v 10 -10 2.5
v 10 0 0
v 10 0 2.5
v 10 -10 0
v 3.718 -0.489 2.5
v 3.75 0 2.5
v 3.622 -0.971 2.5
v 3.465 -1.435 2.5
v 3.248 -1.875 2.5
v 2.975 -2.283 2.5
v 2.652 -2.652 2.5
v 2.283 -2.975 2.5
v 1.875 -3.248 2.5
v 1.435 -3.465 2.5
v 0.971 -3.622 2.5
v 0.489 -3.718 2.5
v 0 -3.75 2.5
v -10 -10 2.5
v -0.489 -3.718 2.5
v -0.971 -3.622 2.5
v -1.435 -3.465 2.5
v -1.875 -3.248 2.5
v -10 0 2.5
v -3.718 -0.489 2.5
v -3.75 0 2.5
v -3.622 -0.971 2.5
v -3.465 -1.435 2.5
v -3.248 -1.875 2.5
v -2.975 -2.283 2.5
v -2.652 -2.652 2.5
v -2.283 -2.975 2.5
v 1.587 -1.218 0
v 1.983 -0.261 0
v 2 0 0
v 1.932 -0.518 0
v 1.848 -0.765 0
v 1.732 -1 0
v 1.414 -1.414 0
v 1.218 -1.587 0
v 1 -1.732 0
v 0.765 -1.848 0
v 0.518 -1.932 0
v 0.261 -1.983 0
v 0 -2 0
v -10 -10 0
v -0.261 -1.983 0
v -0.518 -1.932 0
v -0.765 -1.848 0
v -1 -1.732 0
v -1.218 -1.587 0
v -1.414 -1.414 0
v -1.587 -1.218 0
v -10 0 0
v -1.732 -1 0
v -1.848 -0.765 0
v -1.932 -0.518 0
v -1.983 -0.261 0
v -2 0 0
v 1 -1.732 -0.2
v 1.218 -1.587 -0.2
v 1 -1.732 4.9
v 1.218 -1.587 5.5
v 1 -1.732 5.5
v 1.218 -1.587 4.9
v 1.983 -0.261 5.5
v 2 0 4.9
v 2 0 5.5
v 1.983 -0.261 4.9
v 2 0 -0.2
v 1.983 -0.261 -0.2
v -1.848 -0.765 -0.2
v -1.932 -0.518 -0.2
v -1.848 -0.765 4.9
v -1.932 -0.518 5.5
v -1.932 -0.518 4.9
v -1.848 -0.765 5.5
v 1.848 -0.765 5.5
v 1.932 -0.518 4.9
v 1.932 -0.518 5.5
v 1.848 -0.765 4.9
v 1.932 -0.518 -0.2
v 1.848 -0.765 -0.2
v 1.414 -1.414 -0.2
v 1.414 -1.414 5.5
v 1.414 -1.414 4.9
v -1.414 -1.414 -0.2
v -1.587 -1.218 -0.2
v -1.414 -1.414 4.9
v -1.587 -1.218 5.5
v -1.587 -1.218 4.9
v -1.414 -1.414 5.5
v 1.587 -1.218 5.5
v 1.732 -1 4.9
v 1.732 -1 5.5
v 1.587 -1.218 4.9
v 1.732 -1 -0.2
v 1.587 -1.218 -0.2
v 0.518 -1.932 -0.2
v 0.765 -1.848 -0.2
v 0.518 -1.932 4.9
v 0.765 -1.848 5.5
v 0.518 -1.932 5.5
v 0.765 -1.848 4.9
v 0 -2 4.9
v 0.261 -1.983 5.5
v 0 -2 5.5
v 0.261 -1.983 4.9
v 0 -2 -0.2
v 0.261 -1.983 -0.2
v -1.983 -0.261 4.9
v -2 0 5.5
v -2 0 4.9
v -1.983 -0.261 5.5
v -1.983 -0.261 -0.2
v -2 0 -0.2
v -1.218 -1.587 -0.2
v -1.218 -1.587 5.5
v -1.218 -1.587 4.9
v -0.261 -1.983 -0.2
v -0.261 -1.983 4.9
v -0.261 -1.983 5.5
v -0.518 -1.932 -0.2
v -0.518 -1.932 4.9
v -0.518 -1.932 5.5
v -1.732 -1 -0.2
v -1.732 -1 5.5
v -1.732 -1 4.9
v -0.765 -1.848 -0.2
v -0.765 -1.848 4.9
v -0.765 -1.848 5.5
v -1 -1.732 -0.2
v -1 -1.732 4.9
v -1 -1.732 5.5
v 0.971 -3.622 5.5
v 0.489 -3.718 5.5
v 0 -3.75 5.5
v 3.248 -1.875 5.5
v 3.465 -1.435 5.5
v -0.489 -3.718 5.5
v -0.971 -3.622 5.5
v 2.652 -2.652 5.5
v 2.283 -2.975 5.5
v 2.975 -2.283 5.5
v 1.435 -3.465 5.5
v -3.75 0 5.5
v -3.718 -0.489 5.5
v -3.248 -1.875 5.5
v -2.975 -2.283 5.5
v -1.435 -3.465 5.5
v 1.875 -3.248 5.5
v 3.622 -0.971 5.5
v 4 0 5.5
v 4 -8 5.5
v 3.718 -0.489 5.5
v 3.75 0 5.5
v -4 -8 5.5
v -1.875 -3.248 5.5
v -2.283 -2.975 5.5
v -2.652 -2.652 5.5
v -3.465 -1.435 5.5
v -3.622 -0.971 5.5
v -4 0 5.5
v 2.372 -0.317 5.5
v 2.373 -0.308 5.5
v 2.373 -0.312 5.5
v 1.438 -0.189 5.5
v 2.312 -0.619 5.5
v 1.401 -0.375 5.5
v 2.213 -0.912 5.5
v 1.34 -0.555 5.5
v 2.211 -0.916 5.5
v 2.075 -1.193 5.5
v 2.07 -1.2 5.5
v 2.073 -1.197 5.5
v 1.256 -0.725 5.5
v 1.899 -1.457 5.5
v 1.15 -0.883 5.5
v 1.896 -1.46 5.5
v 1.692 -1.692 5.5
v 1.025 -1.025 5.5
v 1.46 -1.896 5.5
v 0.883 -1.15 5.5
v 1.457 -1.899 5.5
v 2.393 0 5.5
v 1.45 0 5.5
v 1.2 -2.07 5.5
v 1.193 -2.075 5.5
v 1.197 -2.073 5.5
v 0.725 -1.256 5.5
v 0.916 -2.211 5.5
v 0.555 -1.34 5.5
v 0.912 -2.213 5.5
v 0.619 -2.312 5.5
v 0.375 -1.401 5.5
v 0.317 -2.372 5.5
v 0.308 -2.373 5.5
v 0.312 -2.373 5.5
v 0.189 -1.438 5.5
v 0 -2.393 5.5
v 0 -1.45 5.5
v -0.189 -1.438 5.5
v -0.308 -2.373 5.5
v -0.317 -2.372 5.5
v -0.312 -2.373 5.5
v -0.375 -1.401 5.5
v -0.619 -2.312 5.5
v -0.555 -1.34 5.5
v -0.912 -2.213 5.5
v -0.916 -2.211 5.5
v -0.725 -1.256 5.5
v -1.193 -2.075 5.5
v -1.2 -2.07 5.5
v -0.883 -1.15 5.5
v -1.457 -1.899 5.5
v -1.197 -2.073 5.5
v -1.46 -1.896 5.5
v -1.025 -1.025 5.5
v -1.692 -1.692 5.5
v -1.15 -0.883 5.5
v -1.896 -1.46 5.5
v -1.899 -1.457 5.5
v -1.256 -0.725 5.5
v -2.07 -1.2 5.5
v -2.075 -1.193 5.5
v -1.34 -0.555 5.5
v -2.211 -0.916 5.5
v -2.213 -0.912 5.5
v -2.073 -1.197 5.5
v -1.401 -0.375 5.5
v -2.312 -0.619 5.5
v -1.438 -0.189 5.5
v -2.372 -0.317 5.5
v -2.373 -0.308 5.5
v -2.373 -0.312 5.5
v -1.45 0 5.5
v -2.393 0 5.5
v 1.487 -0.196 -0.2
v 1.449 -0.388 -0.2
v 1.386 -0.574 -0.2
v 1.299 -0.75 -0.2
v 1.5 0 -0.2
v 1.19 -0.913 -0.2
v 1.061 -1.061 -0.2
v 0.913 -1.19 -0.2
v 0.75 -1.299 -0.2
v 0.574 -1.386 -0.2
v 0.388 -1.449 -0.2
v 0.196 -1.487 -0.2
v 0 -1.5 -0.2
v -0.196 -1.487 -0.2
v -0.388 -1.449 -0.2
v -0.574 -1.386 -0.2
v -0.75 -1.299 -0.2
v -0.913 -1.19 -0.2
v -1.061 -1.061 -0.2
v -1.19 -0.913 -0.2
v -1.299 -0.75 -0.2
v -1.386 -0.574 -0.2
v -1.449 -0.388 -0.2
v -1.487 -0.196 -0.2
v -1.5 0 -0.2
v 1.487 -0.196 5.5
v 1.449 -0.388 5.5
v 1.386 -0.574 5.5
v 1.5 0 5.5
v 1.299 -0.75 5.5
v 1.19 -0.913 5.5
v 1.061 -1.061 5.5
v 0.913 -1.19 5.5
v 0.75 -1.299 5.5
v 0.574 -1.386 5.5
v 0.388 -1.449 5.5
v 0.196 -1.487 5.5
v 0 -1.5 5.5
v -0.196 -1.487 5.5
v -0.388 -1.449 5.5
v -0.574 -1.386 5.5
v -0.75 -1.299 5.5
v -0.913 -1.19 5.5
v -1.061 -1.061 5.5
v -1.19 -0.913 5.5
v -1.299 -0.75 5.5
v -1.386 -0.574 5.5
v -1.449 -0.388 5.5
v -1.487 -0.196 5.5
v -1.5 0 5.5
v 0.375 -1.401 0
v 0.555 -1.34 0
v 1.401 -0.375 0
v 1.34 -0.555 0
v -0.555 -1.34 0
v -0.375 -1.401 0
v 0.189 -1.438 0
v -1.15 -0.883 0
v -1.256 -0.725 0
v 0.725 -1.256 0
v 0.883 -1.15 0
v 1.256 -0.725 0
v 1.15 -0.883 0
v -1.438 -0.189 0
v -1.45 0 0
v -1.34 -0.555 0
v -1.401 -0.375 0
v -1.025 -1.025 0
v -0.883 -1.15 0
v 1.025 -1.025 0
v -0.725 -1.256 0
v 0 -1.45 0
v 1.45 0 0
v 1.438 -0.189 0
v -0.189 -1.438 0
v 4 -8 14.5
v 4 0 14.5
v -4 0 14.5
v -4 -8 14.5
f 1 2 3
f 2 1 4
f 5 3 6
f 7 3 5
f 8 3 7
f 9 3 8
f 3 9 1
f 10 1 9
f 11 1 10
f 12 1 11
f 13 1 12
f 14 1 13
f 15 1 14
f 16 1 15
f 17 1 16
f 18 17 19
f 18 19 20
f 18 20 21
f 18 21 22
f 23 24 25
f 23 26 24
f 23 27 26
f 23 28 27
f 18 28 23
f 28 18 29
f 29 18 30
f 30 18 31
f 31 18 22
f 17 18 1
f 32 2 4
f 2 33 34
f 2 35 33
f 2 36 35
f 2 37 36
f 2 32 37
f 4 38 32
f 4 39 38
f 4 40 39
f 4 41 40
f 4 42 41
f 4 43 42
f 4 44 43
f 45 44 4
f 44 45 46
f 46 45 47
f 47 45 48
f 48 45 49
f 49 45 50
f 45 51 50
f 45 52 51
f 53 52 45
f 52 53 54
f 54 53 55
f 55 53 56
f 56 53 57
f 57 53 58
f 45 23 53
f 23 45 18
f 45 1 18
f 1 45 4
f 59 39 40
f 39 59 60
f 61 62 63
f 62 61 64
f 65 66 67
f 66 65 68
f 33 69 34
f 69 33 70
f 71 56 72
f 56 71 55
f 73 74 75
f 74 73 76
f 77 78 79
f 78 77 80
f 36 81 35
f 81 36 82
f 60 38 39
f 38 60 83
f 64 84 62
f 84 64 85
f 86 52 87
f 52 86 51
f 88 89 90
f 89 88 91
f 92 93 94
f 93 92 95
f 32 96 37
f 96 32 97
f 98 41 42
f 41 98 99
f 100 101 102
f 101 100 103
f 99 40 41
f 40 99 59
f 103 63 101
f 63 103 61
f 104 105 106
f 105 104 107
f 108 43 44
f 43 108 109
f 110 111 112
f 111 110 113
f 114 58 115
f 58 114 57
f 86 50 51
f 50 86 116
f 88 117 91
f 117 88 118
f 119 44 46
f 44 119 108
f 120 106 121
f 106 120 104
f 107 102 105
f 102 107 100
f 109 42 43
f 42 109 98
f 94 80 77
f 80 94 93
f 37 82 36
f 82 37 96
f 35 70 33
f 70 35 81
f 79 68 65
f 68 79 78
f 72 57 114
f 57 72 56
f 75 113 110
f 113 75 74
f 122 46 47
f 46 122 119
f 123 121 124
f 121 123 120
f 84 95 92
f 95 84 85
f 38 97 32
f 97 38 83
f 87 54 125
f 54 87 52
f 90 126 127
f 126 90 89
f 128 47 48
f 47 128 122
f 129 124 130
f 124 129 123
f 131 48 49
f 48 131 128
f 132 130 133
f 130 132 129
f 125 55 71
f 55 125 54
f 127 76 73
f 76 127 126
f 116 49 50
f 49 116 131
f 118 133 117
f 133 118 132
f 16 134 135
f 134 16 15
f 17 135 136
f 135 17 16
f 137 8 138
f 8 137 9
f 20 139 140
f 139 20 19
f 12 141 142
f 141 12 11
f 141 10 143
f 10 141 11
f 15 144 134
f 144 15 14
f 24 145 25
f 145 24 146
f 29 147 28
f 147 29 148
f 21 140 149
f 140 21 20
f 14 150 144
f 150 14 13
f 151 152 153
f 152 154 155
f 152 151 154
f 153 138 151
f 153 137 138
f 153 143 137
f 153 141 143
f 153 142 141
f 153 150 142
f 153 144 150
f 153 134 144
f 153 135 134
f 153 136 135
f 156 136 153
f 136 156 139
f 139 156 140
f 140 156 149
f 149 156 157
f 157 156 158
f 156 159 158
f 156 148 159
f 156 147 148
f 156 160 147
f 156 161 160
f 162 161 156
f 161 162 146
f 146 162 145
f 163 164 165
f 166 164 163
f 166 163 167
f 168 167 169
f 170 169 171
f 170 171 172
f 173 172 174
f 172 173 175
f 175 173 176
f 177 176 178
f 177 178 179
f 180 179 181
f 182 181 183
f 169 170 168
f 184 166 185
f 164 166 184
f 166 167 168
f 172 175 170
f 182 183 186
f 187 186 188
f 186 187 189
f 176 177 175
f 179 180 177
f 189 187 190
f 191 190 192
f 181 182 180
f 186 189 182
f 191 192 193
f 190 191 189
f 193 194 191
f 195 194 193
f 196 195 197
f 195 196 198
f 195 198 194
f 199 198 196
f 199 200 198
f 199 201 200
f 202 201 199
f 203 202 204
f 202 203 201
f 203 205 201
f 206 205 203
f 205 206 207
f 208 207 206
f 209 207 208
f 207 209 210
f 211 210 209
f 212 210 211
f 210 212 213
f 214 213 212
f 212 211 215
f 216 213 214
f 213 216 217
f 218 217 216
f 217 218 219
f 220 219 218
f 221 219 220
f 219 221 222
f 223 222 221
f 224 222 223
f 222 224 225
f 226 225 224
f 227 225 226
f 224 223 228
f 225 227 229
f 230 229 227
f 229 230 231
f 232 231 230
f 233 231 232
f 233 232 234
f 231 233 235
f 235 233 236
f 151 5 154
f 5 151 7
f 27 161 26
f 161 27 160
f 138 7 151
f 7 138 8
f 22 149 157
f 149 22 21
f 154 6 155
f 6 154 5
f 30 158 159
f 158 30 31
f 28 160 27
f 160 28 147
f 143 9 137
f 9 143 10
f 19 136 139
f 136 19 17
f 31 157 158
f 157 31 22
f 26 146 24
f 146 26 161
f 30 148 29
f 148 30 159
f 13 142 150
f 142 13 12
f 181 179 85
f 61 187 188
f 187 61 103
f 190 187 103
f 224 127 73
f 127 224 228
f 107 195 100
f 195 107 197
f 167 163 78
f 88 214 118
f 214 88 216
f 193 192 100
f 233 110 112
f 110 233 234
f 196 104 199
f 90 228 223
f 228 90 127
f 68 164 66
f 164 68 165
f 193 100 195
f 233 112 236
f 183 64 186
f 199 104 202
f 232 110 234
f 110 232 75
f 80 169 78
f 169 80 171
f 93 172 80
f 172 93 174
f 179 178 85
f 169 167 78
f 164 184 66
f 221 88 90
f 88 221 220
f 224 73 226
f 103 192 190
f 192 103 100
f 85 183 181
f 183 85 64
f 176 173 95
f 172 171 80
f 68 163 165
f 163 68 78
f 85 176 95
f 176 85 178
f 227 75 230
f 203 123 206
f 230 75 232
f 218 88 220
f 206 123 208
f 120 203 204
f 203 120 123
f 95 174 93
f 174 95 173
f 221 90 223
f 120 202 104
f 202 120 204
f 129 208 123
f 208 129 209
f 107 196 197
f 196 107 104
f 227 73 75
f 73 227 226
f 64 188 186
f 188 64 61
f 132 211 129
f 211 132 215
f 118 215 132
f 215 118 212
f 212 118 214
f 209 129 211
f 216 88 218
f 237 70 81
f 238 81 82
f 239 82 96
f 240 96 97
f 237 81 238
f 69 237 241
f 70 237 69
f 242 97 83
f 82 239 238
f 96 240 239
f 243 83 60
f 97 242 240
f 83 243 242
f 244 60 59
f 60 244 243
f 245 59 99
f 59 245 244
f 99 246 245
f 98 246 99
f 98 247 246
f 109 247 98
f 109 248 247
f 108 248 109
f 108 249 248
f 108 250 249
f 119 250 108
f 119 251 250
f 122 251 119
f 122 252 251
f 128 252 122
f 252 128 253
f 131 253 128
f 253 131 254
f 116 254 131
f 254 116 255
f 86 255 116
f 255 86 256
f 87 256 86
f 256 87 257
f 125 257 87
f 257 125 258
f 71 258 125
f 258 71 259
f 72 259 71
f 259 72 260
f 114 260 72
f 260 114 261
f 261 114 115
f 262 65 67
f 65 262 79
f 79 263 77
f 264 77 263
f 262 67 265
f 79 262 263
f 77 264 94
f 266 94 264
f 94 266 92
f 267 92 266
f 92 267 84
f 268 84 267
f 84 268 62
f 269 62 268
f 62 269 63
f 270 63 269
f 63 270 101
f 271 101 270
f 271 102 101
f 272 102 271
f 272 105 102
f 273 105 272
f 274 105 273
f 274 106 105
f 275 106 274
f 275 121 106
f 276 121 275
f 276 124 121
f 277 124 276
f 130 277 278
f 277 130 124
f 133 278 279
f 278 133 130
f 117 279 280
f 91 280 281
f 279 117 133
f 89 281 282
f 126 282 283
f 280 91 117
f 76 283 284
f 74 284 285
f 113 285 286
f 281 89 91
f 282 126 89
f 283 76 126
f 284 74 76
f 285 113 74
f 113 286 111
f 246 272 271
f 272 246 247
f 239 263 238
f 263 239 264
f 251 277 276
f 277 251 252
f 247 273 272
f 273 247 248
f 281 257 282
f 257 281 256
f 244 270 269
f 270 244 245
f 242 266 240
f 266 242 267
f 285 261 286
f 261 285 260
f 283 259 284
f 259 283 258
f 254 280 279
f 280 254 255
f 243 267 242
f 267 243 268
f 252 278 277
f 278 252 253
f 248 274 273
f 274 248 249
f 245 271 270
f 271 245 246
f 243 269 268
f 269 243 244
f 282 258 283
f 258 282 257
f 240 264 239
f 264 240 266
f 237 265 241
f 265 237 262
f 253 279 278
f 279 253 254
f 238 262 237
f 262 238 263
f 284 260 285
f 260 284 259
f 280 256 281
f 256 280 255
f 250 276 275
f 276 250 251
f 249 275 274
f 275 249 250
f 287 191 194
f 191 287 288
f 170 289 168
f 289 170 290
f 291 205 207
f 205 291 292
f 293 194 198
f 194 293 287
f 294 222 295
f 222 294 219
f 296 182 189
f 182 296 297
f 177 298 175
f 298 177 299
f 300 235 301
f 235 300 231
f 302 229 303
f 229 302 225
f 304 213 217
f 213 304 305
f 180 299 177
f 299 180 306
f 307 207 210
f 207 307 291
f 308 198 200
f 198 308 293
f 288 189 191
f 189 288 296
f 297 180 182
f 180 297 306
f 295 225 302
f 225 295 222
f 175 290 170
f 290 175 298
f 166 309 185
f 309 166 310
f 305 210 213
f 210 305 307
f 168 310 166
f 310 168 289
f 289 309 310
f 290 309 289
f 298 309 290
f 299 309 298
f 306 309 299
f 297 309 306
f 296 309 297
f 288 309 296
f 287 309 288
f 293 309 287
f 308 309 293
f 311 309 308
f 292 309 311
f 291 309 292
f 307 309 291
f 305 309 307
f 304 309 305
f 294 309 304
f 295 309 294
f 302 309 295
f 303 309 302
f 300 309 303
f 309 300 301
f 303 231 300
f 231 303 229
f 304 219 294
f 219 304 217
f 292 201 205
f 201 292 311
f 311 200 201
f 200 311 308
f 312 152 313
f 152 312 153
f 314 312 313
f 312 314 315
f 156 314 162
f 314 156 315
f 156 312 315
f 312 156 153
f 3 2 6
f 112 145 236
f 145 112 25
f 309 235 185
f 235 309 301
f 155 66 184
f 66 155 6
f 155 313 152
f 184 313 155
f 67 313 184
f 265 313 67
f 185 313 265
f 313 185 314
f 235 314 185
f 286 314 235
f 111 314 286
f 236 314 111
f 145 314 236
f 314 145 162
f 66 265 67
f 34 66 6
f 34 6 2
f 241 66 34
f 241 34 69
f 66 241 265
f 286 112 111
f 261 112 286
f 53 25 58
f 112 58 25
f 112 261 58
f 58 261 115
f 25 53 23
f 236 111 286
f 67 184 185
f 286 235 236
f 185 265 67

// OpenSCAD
// file: _review.scad
// Shared by the review protos: the colours of a before/after pair.  The part in a neutral grey-blue, the
// geometry a proposal changes in the accent, the parts it mates with in a translucent grey.
NEUTRAL = "#b9c6d6";
ACCENT = "#ff7a1a";
MATE = "#6f7782";
MATE_A = 0.45;
PCB = "#2f6f4f";
module part() color(NEUTRAL) children();
module changed() color(ACCENT) children();
module mate(a = MATE_A) color(MATE, a) children();
// main file
// Review proto (not a part): one of the tray's two chain-anchor bosses cut in half, the insert (copper), the
// anchor block and its M3 × 8 above (grey, translucent).  Today: a 5.5 mm boss with a 5.7 mm insert pocket:
// it goes 0.2 mm through the tray's 2.5 mm floor, a Ø4 hole in the first layer.  Proposed (accent): a 7.5 mm
// boss, 1.8 mm of floor under the insert.  docs/printed-parts-review.md › Chain anchor.
//
//   openscad -D 'VIEW="today"' -o anchor_boss_today.png mechanical/review/proto/anchor_boss.scad
include <_review.scad>
VIEW = "today";
$fn = 48;
module half() difference() { union() children(); translate([-20, 0, -5]) cube([40, 20, 40]); }   // the far half removed: a section
module floor_slab() translate([-10, -10, 0]) cube([20, 20, 2.5]);
module boss(h) difference() {
    cylinder(d = 7.5, h = h);
    translate([0, 0, h - 5.7]) cylinder(d = 4.0, h = 5.7 + 0.01);
    translate([0, 0, h - 0.6]) cylinder(d1 = 4.0, d2 = 4.8, h = 0.61);
}
module floor_cut(h) difference() { floor_slab(); translate([0, 0, h - 5.7]) cylinder(d = 4.0, h = 6); }
module insert(h) color("#b87333") translate([0, 0, h - 5.7]) difference() { cylinder(d = 4.0, h = 5.7); translate([0, 0, -1]) cylinder(d = 3, h = 8); }
module anchor(h) { mate(0.4) translate([-4, -8, h]) cube([8, 16, 9]); color("#8d8d8d", 0.7) translate([0, 0, h - 5.5]) { cylinder(d = 2.9, h = 8 + 5.5); translate([0, 0, h + 3 - h + 5.5]) cylinder(d = 5.6, h = 2); } }

if (VIEW == "today") half() { part() { floor_cut(5.5); boss(5.5); } insert(5.5); anchor(5.5); }
else half() { part() floor_cut(7.5); changed() boss(7.5); insert(7.5); anchor(7.5); }
